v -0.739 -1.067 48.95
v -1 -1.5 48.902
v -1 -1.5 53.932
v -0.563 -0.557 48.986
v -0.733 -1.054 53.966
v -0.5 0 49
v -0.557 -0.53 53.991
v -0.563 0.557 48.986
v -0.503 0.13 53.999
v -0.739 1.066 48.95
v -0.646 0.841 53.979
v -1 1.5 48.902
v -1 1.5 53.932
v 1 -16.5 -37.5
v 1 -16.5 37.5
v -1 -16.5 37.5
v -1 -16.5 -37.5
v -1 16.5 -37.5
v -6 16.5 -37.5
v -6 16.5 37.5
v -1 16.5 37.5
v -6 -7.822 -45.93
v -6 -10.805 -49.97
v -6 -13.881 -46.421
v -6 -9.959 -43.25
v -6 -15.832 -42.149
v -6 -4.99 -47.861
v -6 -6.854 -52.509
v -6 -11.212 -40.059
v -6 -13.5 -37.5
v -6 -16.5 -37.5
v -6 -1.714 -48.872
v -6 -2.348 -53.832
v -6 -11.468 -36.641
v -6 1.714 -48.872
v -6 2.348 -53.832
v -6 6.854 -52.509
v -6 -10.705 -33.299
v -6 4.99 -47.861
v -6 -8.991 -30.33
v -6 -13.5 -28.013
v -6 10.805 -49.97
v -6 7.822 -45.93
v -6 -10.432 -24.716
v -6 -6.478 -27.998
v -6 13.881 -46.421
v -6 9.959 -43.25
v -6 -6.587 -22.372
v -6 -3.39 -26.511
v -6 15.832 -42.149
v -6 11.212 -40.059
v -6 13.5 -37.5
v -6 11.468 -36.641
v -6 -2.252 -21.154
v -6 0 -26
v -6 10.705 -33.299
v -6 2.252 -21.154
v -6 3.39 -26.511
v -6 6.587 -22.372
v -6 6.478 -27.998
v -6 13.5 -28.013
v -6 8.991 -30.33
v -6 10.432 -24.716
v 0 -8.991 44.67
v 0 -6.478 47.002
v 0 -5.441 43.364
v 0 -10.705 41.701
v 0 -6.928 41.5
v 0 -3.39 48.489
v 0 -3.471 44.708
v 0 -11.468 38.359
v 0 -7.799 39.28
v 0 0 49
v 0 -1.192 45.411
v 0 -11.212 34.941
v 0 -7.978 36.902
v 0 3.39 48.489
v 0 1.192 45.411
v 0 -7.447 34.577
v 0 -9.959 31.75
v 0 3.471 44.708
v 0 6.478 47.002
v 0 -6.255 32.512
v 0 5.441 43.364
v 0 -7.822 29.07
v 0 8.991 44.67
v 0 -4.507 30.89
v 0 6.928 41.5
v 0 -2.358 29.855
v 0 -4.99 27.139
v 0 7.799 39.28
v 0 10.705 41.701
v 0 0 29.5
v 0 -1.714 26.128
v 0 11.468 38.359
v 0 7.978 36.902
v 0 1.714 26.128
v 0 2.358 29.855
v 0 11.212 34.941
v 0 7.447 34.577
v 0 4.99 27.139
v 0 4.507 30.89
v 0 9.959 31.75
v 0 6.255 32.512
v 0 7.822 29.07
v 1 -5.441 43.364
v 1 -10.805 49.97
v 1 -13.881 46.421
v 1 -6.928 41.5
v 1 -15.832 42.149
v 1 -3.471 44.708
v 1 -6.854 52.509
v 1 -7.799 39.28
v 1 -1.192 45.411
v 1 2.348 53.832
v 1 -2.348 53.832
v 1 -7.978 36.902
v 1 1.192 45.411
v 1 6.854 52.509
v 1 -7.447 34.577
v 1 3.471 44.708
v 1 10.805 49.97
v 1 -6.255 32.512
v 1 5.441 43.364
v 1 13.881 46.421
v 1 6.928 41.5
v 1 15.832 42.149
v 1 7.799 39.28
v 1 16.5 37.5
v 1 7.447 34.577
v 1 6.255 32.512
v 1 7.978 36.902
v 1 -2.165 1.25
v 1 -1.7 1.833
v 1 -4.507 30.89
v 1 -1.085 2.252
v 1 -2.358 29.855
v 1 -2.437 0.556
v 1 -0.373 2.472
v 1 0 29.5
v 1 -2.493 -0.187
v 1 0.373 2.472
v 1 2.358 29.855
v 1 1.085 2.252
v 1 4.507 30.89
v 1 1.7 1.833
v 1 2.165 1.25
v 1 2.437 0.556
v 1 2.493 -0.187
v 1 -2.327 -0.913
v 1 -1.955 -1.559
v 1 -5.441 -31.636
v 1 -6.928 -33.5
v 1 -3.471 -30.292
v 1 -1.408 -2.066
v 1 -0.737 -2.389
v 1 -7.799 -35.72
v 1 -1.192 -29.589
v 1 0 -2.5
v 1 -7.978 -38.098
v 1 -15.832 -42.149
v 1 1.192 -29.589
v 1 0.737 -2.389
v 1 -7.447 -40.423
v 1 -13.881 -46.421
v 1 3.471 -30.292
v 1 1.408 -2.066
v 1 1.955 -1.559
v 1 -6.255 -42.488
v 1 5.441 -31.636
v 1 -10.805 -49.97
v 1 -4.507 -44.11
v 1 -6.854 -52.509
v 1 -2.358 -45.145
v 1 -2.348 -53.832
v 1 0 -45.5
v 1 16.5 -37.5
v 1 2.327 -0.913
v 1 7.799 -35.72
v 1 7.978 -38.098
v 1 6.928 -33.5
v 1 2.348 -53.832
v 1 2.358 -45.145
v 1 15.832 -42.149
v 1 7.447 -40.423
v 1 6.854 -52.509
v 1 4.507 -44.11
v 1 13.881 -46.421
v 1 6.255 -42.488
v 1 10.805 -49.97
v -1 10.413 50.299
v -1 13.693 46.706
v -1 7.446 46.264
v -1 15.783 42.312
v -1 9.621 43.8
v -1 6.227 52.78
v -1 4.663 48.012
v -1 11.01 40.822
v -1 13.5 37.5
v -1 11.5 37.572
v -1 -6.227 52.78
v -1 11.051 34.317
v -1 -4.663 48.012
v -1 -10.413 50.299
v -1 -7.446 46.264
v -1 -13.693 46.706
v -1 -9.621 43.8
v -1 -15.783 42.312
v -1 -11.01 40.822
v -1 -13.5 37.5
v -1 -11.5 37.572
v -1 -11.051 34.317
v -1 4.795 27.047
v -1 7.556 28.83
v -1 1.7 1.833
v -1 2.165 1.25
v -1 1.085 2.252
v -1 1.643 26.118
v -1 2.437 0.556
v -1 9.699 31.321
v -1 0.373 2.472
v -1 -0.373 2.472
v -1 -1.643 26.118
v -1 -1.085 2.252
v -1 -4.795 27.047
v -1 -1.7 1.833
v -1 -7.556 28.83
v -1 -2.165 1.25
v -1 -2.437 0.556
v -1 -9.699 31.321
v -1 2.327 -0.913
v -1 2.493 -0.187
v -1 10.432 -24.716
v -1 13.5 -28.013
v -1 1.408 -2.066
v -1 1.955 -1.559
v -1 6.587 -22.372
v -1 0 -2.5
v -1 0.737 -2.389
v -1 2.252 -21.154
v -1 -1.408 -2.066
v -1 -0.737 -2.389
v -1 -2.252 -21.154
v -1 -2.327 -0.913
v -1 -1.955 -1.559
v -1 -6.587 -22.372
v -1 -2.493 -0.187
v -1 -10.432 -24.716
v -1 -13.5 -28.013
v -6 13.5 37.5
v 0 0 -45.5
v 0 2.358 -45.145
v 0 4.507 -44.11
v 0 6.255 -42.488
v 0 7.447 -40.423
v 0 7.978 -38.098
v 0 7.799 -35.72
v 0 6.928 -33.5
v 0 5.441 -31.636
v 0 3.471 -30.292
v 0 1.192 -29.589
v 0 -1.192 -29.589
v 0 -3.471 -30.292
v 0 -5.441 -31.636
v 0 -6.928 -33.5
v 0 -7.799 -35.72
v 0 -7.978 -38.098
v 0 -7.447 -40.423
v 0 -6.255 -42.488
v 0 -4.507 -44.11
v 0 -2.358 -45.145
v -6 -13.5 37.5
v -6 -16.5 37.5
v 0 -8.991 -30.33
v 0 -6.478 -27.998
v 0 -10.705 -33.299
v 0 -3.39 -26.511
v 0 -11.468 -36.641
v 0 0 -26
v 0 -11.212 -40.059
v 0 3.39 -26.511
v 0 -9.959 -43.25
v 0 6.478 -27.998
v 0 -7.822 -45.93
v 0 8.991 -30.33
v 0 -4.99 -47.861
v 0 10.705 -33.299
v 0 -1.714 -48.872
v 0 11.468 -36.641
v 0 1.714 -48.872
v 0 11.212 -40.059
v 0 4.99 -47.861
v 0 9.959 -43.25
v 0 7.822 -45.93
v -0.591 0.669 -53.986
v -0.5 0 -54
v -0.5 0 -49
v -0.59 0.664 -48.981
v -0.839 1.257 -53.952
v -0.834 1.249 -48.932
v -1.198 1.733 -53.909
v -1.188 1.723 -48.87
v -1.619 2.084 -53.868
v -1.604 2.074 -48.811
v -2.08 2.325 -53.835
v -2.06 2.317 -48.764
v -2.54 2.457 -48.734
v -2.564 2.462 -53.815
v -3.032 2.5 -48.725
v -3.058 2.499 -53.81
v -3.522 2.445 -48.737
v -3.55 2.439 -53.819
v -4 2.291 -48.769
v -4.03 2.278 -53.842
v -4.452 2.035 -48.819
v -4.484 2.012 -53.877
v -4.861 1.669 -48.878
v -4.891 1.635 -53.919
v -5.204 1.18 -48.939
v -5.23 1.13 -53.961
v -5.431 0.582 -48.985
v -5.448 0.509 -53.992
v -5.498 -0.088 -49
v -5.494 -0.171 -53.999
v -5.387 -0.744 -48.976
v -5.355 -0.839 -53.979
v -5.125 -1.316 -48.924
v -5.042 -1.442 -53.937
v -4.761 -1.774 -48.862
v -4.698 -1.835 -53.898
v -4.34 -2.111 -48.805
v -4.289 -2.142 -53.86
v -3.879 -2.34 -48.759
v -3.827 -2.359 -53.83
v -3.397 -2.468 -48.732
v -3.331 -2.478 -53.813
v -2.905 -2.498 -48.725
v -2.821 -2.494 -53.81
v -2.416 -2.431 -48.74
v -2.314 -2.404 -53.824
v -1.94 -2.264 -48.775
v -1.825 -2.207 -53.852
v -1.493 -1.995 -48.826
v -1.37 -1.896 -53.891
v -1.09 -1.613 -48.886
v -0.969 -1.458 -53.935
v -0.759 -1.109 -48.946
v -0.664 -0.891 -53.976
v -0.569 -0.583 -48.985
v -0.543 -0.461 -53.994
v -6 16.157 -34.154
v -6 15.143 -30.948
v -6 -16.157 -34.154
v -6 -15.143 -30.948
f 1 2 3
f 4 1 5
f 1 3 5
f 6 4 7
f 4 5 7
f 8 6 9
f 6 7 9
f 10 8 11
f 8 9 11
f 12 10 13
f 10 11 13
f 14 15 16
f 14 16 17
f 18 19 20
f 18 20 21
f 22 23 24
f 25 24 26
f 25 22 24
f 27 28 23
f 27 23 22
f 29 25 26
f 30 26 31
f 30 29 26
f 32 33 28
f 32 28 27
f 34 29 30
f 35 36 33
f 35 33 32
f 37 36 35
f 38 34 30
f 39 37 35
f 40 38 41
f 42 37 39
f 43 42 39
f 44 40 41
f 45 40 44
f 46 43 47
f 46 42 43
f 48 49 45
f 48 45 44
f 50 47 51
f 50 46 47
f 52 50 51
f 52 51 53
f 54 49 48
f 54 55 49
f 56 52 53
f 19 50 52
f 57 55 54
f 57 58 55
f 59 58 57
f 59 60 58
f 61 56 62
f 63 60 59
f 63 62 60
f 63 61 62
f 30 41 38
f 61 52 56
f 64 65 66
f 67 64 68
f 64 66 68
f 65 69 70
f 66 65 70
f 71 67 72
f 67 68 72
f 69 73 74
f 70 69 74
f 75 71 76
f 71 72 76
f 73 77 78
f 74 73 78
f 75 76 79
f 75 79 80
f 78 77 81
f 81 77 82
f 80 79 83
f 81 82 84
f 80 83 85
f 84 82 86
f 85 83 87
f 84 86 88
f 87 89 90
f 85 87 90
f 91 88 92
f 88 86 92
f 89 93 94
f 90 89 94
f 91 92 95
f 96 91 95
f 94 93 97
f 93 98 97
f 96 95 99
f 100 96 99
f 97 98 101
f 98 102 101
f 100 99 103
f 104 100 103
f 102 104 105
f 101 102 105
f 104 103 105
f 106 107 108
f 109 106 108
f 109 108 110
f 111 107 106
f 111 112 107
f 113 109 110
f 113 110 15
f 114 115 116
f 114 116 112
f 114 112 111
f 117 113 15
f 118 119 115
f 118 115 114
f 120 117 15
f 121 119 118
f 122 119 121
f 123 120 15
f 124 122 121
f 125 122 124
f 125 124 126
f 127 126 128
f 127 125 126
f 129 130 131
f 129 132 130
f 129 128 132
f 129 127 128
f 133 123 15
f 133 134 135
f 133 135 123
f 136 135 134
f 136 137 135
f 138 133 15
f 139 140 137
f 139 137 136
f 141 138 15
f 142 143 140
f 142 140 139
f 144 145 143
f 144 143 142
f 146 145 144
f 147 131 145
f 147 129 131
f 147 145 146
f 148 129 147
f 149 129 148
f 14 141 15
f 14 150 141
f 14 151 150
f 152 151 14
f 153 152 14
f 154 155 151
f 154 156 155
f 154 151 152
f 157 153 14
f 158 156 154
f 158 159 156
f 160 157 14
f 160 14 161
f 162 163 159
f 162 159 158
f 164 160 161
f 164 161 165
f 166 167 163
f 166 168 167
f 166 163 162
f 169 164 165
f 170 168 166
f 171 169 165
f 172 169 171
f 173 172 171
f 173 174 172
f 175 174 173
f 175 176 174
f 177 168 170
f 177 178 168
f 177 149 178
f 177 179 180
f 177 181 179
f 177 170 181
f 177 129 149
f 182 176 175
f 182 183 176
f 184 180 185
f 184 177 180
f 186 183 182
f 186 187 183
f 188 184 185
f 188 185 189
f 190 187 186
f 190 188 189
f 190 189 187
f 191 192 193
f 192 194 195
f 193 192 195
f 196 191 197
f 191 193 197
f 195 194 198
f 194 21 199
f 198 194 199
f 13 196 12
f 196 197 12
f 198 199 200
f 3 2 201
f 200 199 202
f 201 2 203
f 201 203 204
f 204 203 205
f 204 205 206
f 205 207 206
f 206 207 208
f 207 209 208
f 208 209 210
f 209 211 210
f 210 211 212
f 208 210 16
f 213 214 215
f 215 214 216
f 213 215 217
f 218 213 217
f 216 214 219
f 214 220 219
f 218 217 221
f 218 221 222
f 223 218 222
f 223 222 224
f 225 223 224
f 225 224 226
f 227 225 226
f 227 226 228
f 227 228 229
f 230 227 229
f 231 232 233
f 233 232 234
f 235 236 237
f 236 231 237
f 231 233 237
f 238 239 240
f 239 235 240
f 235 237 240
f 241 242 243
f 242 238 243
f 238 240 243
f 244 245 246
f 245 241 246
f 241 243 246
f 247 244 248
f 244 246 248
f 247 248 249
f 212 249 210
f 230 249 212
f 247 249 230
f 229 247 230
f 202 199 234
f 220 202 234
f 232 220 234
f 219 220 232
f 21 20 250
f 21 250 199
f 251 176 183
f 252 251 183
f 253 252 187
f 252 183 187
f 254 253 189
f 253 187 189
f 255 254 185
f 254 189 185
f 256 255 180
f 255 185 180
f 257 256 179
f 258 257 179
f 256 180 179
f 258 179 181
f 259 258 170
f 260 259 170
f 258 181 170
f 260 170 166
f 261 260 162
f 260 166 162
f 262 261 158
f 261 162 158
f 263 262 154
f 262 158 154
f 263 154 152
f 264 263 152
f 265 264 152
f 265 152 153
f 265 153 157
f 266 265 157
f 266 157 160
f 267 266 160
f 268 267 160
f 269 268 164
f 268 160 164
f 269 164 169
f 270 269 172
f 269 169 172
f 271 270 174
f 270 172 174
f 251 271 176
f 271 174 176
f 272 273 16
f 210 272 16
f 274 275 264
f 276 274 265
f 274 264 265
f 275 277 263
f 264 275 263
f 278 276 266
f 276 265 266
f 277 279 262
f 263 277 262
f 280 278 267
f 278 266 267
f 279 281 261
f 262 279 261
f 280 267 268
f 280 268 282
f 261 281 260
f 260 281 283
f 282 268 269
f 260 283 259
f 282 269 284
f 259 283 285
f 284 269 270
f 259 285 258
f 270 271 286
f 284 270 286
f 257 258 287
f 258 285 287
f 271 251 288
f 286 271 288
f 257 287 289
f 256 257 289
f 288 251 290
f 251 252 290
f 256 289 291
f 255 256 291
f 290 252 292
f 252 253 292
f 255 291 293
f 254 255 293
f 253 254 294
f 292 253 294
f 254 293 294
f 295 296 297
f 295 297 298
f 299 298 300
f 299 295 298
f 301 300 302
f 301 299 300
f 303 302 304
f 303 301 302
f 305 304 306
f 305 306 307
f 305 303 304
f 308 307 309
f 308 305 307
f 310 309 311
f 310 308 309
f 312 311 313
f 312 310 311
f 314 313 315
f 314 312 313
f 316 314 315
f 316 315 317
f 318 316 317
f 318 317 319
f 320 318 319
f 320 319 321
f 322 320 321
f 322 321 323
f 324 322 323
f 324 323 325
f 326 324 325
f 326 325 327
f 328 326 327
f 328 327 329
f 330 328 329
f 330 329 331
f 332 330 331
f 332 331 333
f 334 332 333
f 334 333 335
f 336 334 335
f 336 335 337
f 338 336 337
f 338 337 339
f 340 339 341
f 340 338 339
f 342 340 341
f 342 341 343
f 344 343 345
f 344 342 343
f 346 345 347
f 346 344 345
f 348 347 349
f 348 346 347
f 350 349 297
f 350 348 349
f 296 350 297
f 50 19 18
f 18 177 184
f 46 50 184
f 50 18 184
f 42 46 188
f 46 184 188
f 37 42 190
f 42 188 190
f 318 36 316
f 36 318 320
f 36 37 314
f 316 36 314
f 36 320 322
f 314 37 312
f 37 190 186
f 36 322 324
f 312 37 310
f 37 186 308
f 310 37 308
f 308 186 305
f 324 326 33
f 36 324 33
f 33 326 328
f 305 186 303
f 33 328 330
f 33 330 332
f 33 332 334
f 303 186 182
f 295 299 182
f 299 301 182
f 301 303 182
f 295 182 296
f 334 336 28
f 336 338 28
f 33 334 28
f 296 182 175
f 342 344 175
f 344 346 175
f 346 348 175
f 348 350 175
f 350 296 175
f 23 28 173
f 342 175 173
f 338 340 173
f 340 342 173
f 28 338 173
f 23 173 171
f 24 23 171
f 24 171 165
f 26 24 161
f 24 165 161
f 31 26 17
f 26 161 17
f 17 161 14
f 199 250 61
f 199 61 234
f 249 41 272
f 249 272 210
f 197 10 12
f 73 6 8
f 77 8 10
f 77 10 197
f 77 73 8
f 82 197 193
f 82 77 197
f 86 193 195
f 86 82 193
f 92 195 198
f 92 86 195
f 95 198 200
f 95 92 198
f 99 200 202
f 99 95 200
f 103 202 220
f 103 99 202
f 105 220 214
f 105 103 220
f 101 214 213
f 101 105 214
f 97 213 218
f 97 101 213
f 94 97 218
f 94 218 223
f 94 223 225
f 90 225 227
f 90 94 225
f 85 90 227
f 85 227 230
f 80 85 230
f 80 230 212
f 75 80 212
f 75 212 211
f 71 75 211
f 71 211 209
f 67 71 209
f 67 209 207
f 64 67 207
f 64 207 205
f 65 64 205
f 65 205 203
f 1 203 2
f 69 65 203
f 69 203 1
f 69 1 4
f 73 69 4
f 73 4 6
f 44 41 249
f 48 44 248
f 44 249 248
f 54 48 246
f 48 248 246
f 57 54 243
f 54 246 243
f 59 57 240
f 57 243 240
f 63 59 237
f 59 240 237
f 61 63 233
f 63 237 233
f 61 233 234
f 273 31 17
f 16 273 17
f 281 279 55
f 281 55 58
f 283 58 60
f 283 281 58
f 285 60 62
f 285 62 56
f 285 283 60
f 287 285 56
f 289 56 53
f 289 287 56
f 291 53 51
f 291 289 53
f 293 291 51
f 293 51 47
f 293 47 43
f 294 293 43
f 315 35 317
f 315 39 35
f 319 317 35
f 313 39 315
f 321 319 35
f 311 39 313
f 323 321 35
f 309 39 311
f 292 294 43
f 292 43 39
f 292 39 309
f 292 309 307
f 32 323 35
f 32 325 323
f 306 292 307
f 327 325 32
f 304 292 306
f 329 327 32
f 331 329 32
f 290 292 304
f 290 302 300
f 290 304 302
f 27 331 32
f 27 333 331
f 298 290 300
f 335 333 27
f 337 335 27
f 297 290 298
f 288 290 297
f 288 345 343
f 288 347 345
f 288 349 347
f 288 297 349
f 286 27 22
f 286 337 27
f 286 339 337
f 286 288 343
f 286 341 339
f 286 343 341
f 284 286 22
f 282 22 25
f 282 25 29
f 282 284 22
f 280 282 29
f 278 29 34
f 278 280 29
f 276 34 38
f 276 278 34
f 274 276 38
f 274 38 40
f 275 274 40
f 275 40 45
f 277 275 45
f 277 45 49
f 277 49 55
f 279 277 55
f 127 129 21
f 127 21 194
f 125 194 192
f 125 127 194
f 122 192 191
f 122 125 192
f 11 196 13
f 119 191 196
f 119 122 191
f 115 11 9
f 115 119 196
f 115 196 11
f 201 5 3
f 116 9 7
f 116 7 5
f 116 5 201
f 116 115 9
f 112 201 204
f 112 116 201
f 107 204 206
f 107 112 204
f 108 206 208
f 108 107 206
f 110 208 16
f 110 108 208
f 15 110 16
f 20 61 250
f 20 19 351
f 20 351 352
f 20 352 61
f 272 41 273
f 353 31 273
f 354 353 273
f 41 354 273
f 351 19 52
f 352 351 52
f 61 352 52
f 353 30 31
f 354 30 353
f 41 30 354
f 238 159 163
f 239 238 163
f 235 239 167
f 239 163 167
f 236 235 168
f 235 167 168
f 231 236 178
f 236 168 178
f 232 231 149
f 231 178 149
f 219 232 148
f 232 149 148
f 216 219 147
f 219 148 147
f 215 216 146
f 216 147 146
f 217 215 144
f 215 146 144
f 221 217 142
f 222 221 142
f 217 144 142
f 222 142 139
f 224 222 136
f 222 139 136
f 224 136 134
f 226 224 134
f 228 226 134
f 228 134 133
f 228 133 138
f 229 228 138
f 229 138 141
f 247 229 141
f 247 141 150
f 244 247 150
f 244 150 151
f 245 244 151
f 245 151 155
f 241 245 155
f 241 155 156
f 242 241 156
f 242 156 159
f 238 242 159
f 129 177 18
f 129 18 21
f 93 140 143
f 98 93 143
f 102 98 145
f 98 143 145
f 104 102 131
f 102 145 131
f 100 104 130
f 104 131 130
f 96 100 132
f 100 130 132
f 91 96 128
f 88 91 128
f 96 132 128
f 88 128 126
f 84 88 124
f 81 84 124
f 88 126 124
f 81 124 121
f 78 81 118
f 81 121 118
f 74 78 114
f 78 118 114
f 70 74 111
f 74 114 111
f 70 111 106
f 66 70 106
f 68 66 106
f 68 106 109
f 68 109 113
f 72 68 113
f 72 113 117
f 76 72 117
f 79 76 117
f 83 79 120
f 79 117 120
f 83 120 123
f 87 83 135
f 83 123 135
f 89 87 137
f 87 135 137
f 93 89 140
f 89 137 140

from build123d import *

# Parameters (mm, degrees)
SKETCH3_R           = 11.5
BOSS_EXTRUDE2_DEPTH = 1
BOSS_EXTRUDE3_START = 1
SKETCH4_R           = 8
BOSS_EXTRUDE3_DEPTH = 1
SKETCH5_R           = 11.5
BOSS_EXTRUDE4_DEPTH = 5
SKETCH6_R           = 2.5
CUT_EXTRUDE1_DEPTH  = 10
SKETCH7_R           = 2.5
CUT_EXTRUDE2_DEPTH  = 57.896836604
SKETCH11_W          = 5
SKETCH11_H          = 75
BOSS_EXTRUDE7_DEPTH = 3


with BuildPart() as part:
    # Sketch3 → Boss-Extrude2 (new body)
    with BuildSketch(Plane(origin=(0, 20, 0), x_dir=(0, 1, 0), z_dir=(-1, 0, 0))):
        with BuildLine():
            Line((-3.5, 37.5), (-3.5, -37.5))
            ThreePointArc((-3.5, -37.5), (-20, -54), (-36.5, -37.5))
            Line((-36.5, -37.5), (-36.5, 37.5))
            ThreePointArc((-36.5, 37.5), (-20, 54), (-3.5, 37.5))
        make_face()
        with Locations(Location((-20, -37.5, 0), (0, 0, 270))):
            Circle(SKETCH3_R, mode=Mode.SUBTRACT)
        with Locations(Location((-20, 37.5, 0), (0, 0, 270))):
            Circle(SKETCH3_R, mode=Mode.SUBTRACT)
    extrude(amount=BOSS_EXTRUDE2_DEPTH)

    # Sketch4 → Boss-Extrude3 (add)
    with BuildSketch(Plane(origin=(0, 0, 0), x_dir=(0, 0, -1), z_dir=(1, 0, 0)).offset(BOSS_EXTRUDE3_START)):
        with BuildLine():
            Line((37.5, 16.5), (-37.5, 16.5))
            ThreePointArc((-37.5, 16.5), (-54, 0), (-37.5, -16.5))
            Line((-37.5, -16.5), (37.5, -16.5))
            ThreePointArc((37.5, -16.5), (54, 0), (37.5, 16.5))
        make_face()
        with Locations((-37.5, 0)):
            Circle(SKETCH4_R, mode=Mode.SUBTRACT)
        with Locations((37.5, 0)):
            Circle(SKETCH4_R, mode=Mode.SUBTRACT)
    extrude(amount=-BOSS_EXTRUDE3_DEPTH)

    # Sketch5 → Boss-Extrude4 (add)
    with BuildSketch(Plane.ZY.offset(1)):
        with BuildLine():
            ThreePointArc((-37.5, 16.5), (-54, 0), (-37.5, -16.5))
            ThreePointArc((-37.5, -16.5), (-21, 0), (-37.5, 16.5))
        make_face()
        with Locations((-37.5, 0)):
            Circle(SKETCH5_R, mode=Mode.SUBTRACT)
    extrude(amount=BOSS_EXTRUDE4_DEPTH)

    # Sketch6 → Cut-Extrude1 (cut)
    with BuildSketch(Plane.XY.offset(54)):
        with Locations((-3, 0)):
            Circle(SKETCH6_R)
    cut_extrude1 = extrude(amount=-CUT_EXTRUDE1_DEPTH, mode=Mode.SUBTRACT)

    # Mirror1: Cut-Extrude1 across plane
    add(cut_extrude1.mirror(Plane.XY), mode=Mode.SUBTRACT)

    # Sketch7 → Cut-Extrude2 (cut, through all)
    with BuildSketch(Plane(origin=(1, 0, 0), x_dir=(0, 0, -1), z_dir=(1, 0, 0))):
        Circle(SKETCH7_R)
    extrude(amount=-CUT_EXTRUDE2_DEPTH, mode=Mode.SUBTRACT)

    # Sketch11 → Boss-Extrude7 (add)
    with BuildSketch(Plane.XZ.offset(16.5)):
        with Locations((-3.5, 0)):
            Rectangle(SKETCH11_W, SKETCH11_H)
    boss_extrude7 = extrude(amount=-BOSS_EXTRUDE7_DEPTH)

    # Mirror2: Boss-Extrude7 across plane
    add(boss_extrude7.mirror(Plane.ZX))


solid = part.part
